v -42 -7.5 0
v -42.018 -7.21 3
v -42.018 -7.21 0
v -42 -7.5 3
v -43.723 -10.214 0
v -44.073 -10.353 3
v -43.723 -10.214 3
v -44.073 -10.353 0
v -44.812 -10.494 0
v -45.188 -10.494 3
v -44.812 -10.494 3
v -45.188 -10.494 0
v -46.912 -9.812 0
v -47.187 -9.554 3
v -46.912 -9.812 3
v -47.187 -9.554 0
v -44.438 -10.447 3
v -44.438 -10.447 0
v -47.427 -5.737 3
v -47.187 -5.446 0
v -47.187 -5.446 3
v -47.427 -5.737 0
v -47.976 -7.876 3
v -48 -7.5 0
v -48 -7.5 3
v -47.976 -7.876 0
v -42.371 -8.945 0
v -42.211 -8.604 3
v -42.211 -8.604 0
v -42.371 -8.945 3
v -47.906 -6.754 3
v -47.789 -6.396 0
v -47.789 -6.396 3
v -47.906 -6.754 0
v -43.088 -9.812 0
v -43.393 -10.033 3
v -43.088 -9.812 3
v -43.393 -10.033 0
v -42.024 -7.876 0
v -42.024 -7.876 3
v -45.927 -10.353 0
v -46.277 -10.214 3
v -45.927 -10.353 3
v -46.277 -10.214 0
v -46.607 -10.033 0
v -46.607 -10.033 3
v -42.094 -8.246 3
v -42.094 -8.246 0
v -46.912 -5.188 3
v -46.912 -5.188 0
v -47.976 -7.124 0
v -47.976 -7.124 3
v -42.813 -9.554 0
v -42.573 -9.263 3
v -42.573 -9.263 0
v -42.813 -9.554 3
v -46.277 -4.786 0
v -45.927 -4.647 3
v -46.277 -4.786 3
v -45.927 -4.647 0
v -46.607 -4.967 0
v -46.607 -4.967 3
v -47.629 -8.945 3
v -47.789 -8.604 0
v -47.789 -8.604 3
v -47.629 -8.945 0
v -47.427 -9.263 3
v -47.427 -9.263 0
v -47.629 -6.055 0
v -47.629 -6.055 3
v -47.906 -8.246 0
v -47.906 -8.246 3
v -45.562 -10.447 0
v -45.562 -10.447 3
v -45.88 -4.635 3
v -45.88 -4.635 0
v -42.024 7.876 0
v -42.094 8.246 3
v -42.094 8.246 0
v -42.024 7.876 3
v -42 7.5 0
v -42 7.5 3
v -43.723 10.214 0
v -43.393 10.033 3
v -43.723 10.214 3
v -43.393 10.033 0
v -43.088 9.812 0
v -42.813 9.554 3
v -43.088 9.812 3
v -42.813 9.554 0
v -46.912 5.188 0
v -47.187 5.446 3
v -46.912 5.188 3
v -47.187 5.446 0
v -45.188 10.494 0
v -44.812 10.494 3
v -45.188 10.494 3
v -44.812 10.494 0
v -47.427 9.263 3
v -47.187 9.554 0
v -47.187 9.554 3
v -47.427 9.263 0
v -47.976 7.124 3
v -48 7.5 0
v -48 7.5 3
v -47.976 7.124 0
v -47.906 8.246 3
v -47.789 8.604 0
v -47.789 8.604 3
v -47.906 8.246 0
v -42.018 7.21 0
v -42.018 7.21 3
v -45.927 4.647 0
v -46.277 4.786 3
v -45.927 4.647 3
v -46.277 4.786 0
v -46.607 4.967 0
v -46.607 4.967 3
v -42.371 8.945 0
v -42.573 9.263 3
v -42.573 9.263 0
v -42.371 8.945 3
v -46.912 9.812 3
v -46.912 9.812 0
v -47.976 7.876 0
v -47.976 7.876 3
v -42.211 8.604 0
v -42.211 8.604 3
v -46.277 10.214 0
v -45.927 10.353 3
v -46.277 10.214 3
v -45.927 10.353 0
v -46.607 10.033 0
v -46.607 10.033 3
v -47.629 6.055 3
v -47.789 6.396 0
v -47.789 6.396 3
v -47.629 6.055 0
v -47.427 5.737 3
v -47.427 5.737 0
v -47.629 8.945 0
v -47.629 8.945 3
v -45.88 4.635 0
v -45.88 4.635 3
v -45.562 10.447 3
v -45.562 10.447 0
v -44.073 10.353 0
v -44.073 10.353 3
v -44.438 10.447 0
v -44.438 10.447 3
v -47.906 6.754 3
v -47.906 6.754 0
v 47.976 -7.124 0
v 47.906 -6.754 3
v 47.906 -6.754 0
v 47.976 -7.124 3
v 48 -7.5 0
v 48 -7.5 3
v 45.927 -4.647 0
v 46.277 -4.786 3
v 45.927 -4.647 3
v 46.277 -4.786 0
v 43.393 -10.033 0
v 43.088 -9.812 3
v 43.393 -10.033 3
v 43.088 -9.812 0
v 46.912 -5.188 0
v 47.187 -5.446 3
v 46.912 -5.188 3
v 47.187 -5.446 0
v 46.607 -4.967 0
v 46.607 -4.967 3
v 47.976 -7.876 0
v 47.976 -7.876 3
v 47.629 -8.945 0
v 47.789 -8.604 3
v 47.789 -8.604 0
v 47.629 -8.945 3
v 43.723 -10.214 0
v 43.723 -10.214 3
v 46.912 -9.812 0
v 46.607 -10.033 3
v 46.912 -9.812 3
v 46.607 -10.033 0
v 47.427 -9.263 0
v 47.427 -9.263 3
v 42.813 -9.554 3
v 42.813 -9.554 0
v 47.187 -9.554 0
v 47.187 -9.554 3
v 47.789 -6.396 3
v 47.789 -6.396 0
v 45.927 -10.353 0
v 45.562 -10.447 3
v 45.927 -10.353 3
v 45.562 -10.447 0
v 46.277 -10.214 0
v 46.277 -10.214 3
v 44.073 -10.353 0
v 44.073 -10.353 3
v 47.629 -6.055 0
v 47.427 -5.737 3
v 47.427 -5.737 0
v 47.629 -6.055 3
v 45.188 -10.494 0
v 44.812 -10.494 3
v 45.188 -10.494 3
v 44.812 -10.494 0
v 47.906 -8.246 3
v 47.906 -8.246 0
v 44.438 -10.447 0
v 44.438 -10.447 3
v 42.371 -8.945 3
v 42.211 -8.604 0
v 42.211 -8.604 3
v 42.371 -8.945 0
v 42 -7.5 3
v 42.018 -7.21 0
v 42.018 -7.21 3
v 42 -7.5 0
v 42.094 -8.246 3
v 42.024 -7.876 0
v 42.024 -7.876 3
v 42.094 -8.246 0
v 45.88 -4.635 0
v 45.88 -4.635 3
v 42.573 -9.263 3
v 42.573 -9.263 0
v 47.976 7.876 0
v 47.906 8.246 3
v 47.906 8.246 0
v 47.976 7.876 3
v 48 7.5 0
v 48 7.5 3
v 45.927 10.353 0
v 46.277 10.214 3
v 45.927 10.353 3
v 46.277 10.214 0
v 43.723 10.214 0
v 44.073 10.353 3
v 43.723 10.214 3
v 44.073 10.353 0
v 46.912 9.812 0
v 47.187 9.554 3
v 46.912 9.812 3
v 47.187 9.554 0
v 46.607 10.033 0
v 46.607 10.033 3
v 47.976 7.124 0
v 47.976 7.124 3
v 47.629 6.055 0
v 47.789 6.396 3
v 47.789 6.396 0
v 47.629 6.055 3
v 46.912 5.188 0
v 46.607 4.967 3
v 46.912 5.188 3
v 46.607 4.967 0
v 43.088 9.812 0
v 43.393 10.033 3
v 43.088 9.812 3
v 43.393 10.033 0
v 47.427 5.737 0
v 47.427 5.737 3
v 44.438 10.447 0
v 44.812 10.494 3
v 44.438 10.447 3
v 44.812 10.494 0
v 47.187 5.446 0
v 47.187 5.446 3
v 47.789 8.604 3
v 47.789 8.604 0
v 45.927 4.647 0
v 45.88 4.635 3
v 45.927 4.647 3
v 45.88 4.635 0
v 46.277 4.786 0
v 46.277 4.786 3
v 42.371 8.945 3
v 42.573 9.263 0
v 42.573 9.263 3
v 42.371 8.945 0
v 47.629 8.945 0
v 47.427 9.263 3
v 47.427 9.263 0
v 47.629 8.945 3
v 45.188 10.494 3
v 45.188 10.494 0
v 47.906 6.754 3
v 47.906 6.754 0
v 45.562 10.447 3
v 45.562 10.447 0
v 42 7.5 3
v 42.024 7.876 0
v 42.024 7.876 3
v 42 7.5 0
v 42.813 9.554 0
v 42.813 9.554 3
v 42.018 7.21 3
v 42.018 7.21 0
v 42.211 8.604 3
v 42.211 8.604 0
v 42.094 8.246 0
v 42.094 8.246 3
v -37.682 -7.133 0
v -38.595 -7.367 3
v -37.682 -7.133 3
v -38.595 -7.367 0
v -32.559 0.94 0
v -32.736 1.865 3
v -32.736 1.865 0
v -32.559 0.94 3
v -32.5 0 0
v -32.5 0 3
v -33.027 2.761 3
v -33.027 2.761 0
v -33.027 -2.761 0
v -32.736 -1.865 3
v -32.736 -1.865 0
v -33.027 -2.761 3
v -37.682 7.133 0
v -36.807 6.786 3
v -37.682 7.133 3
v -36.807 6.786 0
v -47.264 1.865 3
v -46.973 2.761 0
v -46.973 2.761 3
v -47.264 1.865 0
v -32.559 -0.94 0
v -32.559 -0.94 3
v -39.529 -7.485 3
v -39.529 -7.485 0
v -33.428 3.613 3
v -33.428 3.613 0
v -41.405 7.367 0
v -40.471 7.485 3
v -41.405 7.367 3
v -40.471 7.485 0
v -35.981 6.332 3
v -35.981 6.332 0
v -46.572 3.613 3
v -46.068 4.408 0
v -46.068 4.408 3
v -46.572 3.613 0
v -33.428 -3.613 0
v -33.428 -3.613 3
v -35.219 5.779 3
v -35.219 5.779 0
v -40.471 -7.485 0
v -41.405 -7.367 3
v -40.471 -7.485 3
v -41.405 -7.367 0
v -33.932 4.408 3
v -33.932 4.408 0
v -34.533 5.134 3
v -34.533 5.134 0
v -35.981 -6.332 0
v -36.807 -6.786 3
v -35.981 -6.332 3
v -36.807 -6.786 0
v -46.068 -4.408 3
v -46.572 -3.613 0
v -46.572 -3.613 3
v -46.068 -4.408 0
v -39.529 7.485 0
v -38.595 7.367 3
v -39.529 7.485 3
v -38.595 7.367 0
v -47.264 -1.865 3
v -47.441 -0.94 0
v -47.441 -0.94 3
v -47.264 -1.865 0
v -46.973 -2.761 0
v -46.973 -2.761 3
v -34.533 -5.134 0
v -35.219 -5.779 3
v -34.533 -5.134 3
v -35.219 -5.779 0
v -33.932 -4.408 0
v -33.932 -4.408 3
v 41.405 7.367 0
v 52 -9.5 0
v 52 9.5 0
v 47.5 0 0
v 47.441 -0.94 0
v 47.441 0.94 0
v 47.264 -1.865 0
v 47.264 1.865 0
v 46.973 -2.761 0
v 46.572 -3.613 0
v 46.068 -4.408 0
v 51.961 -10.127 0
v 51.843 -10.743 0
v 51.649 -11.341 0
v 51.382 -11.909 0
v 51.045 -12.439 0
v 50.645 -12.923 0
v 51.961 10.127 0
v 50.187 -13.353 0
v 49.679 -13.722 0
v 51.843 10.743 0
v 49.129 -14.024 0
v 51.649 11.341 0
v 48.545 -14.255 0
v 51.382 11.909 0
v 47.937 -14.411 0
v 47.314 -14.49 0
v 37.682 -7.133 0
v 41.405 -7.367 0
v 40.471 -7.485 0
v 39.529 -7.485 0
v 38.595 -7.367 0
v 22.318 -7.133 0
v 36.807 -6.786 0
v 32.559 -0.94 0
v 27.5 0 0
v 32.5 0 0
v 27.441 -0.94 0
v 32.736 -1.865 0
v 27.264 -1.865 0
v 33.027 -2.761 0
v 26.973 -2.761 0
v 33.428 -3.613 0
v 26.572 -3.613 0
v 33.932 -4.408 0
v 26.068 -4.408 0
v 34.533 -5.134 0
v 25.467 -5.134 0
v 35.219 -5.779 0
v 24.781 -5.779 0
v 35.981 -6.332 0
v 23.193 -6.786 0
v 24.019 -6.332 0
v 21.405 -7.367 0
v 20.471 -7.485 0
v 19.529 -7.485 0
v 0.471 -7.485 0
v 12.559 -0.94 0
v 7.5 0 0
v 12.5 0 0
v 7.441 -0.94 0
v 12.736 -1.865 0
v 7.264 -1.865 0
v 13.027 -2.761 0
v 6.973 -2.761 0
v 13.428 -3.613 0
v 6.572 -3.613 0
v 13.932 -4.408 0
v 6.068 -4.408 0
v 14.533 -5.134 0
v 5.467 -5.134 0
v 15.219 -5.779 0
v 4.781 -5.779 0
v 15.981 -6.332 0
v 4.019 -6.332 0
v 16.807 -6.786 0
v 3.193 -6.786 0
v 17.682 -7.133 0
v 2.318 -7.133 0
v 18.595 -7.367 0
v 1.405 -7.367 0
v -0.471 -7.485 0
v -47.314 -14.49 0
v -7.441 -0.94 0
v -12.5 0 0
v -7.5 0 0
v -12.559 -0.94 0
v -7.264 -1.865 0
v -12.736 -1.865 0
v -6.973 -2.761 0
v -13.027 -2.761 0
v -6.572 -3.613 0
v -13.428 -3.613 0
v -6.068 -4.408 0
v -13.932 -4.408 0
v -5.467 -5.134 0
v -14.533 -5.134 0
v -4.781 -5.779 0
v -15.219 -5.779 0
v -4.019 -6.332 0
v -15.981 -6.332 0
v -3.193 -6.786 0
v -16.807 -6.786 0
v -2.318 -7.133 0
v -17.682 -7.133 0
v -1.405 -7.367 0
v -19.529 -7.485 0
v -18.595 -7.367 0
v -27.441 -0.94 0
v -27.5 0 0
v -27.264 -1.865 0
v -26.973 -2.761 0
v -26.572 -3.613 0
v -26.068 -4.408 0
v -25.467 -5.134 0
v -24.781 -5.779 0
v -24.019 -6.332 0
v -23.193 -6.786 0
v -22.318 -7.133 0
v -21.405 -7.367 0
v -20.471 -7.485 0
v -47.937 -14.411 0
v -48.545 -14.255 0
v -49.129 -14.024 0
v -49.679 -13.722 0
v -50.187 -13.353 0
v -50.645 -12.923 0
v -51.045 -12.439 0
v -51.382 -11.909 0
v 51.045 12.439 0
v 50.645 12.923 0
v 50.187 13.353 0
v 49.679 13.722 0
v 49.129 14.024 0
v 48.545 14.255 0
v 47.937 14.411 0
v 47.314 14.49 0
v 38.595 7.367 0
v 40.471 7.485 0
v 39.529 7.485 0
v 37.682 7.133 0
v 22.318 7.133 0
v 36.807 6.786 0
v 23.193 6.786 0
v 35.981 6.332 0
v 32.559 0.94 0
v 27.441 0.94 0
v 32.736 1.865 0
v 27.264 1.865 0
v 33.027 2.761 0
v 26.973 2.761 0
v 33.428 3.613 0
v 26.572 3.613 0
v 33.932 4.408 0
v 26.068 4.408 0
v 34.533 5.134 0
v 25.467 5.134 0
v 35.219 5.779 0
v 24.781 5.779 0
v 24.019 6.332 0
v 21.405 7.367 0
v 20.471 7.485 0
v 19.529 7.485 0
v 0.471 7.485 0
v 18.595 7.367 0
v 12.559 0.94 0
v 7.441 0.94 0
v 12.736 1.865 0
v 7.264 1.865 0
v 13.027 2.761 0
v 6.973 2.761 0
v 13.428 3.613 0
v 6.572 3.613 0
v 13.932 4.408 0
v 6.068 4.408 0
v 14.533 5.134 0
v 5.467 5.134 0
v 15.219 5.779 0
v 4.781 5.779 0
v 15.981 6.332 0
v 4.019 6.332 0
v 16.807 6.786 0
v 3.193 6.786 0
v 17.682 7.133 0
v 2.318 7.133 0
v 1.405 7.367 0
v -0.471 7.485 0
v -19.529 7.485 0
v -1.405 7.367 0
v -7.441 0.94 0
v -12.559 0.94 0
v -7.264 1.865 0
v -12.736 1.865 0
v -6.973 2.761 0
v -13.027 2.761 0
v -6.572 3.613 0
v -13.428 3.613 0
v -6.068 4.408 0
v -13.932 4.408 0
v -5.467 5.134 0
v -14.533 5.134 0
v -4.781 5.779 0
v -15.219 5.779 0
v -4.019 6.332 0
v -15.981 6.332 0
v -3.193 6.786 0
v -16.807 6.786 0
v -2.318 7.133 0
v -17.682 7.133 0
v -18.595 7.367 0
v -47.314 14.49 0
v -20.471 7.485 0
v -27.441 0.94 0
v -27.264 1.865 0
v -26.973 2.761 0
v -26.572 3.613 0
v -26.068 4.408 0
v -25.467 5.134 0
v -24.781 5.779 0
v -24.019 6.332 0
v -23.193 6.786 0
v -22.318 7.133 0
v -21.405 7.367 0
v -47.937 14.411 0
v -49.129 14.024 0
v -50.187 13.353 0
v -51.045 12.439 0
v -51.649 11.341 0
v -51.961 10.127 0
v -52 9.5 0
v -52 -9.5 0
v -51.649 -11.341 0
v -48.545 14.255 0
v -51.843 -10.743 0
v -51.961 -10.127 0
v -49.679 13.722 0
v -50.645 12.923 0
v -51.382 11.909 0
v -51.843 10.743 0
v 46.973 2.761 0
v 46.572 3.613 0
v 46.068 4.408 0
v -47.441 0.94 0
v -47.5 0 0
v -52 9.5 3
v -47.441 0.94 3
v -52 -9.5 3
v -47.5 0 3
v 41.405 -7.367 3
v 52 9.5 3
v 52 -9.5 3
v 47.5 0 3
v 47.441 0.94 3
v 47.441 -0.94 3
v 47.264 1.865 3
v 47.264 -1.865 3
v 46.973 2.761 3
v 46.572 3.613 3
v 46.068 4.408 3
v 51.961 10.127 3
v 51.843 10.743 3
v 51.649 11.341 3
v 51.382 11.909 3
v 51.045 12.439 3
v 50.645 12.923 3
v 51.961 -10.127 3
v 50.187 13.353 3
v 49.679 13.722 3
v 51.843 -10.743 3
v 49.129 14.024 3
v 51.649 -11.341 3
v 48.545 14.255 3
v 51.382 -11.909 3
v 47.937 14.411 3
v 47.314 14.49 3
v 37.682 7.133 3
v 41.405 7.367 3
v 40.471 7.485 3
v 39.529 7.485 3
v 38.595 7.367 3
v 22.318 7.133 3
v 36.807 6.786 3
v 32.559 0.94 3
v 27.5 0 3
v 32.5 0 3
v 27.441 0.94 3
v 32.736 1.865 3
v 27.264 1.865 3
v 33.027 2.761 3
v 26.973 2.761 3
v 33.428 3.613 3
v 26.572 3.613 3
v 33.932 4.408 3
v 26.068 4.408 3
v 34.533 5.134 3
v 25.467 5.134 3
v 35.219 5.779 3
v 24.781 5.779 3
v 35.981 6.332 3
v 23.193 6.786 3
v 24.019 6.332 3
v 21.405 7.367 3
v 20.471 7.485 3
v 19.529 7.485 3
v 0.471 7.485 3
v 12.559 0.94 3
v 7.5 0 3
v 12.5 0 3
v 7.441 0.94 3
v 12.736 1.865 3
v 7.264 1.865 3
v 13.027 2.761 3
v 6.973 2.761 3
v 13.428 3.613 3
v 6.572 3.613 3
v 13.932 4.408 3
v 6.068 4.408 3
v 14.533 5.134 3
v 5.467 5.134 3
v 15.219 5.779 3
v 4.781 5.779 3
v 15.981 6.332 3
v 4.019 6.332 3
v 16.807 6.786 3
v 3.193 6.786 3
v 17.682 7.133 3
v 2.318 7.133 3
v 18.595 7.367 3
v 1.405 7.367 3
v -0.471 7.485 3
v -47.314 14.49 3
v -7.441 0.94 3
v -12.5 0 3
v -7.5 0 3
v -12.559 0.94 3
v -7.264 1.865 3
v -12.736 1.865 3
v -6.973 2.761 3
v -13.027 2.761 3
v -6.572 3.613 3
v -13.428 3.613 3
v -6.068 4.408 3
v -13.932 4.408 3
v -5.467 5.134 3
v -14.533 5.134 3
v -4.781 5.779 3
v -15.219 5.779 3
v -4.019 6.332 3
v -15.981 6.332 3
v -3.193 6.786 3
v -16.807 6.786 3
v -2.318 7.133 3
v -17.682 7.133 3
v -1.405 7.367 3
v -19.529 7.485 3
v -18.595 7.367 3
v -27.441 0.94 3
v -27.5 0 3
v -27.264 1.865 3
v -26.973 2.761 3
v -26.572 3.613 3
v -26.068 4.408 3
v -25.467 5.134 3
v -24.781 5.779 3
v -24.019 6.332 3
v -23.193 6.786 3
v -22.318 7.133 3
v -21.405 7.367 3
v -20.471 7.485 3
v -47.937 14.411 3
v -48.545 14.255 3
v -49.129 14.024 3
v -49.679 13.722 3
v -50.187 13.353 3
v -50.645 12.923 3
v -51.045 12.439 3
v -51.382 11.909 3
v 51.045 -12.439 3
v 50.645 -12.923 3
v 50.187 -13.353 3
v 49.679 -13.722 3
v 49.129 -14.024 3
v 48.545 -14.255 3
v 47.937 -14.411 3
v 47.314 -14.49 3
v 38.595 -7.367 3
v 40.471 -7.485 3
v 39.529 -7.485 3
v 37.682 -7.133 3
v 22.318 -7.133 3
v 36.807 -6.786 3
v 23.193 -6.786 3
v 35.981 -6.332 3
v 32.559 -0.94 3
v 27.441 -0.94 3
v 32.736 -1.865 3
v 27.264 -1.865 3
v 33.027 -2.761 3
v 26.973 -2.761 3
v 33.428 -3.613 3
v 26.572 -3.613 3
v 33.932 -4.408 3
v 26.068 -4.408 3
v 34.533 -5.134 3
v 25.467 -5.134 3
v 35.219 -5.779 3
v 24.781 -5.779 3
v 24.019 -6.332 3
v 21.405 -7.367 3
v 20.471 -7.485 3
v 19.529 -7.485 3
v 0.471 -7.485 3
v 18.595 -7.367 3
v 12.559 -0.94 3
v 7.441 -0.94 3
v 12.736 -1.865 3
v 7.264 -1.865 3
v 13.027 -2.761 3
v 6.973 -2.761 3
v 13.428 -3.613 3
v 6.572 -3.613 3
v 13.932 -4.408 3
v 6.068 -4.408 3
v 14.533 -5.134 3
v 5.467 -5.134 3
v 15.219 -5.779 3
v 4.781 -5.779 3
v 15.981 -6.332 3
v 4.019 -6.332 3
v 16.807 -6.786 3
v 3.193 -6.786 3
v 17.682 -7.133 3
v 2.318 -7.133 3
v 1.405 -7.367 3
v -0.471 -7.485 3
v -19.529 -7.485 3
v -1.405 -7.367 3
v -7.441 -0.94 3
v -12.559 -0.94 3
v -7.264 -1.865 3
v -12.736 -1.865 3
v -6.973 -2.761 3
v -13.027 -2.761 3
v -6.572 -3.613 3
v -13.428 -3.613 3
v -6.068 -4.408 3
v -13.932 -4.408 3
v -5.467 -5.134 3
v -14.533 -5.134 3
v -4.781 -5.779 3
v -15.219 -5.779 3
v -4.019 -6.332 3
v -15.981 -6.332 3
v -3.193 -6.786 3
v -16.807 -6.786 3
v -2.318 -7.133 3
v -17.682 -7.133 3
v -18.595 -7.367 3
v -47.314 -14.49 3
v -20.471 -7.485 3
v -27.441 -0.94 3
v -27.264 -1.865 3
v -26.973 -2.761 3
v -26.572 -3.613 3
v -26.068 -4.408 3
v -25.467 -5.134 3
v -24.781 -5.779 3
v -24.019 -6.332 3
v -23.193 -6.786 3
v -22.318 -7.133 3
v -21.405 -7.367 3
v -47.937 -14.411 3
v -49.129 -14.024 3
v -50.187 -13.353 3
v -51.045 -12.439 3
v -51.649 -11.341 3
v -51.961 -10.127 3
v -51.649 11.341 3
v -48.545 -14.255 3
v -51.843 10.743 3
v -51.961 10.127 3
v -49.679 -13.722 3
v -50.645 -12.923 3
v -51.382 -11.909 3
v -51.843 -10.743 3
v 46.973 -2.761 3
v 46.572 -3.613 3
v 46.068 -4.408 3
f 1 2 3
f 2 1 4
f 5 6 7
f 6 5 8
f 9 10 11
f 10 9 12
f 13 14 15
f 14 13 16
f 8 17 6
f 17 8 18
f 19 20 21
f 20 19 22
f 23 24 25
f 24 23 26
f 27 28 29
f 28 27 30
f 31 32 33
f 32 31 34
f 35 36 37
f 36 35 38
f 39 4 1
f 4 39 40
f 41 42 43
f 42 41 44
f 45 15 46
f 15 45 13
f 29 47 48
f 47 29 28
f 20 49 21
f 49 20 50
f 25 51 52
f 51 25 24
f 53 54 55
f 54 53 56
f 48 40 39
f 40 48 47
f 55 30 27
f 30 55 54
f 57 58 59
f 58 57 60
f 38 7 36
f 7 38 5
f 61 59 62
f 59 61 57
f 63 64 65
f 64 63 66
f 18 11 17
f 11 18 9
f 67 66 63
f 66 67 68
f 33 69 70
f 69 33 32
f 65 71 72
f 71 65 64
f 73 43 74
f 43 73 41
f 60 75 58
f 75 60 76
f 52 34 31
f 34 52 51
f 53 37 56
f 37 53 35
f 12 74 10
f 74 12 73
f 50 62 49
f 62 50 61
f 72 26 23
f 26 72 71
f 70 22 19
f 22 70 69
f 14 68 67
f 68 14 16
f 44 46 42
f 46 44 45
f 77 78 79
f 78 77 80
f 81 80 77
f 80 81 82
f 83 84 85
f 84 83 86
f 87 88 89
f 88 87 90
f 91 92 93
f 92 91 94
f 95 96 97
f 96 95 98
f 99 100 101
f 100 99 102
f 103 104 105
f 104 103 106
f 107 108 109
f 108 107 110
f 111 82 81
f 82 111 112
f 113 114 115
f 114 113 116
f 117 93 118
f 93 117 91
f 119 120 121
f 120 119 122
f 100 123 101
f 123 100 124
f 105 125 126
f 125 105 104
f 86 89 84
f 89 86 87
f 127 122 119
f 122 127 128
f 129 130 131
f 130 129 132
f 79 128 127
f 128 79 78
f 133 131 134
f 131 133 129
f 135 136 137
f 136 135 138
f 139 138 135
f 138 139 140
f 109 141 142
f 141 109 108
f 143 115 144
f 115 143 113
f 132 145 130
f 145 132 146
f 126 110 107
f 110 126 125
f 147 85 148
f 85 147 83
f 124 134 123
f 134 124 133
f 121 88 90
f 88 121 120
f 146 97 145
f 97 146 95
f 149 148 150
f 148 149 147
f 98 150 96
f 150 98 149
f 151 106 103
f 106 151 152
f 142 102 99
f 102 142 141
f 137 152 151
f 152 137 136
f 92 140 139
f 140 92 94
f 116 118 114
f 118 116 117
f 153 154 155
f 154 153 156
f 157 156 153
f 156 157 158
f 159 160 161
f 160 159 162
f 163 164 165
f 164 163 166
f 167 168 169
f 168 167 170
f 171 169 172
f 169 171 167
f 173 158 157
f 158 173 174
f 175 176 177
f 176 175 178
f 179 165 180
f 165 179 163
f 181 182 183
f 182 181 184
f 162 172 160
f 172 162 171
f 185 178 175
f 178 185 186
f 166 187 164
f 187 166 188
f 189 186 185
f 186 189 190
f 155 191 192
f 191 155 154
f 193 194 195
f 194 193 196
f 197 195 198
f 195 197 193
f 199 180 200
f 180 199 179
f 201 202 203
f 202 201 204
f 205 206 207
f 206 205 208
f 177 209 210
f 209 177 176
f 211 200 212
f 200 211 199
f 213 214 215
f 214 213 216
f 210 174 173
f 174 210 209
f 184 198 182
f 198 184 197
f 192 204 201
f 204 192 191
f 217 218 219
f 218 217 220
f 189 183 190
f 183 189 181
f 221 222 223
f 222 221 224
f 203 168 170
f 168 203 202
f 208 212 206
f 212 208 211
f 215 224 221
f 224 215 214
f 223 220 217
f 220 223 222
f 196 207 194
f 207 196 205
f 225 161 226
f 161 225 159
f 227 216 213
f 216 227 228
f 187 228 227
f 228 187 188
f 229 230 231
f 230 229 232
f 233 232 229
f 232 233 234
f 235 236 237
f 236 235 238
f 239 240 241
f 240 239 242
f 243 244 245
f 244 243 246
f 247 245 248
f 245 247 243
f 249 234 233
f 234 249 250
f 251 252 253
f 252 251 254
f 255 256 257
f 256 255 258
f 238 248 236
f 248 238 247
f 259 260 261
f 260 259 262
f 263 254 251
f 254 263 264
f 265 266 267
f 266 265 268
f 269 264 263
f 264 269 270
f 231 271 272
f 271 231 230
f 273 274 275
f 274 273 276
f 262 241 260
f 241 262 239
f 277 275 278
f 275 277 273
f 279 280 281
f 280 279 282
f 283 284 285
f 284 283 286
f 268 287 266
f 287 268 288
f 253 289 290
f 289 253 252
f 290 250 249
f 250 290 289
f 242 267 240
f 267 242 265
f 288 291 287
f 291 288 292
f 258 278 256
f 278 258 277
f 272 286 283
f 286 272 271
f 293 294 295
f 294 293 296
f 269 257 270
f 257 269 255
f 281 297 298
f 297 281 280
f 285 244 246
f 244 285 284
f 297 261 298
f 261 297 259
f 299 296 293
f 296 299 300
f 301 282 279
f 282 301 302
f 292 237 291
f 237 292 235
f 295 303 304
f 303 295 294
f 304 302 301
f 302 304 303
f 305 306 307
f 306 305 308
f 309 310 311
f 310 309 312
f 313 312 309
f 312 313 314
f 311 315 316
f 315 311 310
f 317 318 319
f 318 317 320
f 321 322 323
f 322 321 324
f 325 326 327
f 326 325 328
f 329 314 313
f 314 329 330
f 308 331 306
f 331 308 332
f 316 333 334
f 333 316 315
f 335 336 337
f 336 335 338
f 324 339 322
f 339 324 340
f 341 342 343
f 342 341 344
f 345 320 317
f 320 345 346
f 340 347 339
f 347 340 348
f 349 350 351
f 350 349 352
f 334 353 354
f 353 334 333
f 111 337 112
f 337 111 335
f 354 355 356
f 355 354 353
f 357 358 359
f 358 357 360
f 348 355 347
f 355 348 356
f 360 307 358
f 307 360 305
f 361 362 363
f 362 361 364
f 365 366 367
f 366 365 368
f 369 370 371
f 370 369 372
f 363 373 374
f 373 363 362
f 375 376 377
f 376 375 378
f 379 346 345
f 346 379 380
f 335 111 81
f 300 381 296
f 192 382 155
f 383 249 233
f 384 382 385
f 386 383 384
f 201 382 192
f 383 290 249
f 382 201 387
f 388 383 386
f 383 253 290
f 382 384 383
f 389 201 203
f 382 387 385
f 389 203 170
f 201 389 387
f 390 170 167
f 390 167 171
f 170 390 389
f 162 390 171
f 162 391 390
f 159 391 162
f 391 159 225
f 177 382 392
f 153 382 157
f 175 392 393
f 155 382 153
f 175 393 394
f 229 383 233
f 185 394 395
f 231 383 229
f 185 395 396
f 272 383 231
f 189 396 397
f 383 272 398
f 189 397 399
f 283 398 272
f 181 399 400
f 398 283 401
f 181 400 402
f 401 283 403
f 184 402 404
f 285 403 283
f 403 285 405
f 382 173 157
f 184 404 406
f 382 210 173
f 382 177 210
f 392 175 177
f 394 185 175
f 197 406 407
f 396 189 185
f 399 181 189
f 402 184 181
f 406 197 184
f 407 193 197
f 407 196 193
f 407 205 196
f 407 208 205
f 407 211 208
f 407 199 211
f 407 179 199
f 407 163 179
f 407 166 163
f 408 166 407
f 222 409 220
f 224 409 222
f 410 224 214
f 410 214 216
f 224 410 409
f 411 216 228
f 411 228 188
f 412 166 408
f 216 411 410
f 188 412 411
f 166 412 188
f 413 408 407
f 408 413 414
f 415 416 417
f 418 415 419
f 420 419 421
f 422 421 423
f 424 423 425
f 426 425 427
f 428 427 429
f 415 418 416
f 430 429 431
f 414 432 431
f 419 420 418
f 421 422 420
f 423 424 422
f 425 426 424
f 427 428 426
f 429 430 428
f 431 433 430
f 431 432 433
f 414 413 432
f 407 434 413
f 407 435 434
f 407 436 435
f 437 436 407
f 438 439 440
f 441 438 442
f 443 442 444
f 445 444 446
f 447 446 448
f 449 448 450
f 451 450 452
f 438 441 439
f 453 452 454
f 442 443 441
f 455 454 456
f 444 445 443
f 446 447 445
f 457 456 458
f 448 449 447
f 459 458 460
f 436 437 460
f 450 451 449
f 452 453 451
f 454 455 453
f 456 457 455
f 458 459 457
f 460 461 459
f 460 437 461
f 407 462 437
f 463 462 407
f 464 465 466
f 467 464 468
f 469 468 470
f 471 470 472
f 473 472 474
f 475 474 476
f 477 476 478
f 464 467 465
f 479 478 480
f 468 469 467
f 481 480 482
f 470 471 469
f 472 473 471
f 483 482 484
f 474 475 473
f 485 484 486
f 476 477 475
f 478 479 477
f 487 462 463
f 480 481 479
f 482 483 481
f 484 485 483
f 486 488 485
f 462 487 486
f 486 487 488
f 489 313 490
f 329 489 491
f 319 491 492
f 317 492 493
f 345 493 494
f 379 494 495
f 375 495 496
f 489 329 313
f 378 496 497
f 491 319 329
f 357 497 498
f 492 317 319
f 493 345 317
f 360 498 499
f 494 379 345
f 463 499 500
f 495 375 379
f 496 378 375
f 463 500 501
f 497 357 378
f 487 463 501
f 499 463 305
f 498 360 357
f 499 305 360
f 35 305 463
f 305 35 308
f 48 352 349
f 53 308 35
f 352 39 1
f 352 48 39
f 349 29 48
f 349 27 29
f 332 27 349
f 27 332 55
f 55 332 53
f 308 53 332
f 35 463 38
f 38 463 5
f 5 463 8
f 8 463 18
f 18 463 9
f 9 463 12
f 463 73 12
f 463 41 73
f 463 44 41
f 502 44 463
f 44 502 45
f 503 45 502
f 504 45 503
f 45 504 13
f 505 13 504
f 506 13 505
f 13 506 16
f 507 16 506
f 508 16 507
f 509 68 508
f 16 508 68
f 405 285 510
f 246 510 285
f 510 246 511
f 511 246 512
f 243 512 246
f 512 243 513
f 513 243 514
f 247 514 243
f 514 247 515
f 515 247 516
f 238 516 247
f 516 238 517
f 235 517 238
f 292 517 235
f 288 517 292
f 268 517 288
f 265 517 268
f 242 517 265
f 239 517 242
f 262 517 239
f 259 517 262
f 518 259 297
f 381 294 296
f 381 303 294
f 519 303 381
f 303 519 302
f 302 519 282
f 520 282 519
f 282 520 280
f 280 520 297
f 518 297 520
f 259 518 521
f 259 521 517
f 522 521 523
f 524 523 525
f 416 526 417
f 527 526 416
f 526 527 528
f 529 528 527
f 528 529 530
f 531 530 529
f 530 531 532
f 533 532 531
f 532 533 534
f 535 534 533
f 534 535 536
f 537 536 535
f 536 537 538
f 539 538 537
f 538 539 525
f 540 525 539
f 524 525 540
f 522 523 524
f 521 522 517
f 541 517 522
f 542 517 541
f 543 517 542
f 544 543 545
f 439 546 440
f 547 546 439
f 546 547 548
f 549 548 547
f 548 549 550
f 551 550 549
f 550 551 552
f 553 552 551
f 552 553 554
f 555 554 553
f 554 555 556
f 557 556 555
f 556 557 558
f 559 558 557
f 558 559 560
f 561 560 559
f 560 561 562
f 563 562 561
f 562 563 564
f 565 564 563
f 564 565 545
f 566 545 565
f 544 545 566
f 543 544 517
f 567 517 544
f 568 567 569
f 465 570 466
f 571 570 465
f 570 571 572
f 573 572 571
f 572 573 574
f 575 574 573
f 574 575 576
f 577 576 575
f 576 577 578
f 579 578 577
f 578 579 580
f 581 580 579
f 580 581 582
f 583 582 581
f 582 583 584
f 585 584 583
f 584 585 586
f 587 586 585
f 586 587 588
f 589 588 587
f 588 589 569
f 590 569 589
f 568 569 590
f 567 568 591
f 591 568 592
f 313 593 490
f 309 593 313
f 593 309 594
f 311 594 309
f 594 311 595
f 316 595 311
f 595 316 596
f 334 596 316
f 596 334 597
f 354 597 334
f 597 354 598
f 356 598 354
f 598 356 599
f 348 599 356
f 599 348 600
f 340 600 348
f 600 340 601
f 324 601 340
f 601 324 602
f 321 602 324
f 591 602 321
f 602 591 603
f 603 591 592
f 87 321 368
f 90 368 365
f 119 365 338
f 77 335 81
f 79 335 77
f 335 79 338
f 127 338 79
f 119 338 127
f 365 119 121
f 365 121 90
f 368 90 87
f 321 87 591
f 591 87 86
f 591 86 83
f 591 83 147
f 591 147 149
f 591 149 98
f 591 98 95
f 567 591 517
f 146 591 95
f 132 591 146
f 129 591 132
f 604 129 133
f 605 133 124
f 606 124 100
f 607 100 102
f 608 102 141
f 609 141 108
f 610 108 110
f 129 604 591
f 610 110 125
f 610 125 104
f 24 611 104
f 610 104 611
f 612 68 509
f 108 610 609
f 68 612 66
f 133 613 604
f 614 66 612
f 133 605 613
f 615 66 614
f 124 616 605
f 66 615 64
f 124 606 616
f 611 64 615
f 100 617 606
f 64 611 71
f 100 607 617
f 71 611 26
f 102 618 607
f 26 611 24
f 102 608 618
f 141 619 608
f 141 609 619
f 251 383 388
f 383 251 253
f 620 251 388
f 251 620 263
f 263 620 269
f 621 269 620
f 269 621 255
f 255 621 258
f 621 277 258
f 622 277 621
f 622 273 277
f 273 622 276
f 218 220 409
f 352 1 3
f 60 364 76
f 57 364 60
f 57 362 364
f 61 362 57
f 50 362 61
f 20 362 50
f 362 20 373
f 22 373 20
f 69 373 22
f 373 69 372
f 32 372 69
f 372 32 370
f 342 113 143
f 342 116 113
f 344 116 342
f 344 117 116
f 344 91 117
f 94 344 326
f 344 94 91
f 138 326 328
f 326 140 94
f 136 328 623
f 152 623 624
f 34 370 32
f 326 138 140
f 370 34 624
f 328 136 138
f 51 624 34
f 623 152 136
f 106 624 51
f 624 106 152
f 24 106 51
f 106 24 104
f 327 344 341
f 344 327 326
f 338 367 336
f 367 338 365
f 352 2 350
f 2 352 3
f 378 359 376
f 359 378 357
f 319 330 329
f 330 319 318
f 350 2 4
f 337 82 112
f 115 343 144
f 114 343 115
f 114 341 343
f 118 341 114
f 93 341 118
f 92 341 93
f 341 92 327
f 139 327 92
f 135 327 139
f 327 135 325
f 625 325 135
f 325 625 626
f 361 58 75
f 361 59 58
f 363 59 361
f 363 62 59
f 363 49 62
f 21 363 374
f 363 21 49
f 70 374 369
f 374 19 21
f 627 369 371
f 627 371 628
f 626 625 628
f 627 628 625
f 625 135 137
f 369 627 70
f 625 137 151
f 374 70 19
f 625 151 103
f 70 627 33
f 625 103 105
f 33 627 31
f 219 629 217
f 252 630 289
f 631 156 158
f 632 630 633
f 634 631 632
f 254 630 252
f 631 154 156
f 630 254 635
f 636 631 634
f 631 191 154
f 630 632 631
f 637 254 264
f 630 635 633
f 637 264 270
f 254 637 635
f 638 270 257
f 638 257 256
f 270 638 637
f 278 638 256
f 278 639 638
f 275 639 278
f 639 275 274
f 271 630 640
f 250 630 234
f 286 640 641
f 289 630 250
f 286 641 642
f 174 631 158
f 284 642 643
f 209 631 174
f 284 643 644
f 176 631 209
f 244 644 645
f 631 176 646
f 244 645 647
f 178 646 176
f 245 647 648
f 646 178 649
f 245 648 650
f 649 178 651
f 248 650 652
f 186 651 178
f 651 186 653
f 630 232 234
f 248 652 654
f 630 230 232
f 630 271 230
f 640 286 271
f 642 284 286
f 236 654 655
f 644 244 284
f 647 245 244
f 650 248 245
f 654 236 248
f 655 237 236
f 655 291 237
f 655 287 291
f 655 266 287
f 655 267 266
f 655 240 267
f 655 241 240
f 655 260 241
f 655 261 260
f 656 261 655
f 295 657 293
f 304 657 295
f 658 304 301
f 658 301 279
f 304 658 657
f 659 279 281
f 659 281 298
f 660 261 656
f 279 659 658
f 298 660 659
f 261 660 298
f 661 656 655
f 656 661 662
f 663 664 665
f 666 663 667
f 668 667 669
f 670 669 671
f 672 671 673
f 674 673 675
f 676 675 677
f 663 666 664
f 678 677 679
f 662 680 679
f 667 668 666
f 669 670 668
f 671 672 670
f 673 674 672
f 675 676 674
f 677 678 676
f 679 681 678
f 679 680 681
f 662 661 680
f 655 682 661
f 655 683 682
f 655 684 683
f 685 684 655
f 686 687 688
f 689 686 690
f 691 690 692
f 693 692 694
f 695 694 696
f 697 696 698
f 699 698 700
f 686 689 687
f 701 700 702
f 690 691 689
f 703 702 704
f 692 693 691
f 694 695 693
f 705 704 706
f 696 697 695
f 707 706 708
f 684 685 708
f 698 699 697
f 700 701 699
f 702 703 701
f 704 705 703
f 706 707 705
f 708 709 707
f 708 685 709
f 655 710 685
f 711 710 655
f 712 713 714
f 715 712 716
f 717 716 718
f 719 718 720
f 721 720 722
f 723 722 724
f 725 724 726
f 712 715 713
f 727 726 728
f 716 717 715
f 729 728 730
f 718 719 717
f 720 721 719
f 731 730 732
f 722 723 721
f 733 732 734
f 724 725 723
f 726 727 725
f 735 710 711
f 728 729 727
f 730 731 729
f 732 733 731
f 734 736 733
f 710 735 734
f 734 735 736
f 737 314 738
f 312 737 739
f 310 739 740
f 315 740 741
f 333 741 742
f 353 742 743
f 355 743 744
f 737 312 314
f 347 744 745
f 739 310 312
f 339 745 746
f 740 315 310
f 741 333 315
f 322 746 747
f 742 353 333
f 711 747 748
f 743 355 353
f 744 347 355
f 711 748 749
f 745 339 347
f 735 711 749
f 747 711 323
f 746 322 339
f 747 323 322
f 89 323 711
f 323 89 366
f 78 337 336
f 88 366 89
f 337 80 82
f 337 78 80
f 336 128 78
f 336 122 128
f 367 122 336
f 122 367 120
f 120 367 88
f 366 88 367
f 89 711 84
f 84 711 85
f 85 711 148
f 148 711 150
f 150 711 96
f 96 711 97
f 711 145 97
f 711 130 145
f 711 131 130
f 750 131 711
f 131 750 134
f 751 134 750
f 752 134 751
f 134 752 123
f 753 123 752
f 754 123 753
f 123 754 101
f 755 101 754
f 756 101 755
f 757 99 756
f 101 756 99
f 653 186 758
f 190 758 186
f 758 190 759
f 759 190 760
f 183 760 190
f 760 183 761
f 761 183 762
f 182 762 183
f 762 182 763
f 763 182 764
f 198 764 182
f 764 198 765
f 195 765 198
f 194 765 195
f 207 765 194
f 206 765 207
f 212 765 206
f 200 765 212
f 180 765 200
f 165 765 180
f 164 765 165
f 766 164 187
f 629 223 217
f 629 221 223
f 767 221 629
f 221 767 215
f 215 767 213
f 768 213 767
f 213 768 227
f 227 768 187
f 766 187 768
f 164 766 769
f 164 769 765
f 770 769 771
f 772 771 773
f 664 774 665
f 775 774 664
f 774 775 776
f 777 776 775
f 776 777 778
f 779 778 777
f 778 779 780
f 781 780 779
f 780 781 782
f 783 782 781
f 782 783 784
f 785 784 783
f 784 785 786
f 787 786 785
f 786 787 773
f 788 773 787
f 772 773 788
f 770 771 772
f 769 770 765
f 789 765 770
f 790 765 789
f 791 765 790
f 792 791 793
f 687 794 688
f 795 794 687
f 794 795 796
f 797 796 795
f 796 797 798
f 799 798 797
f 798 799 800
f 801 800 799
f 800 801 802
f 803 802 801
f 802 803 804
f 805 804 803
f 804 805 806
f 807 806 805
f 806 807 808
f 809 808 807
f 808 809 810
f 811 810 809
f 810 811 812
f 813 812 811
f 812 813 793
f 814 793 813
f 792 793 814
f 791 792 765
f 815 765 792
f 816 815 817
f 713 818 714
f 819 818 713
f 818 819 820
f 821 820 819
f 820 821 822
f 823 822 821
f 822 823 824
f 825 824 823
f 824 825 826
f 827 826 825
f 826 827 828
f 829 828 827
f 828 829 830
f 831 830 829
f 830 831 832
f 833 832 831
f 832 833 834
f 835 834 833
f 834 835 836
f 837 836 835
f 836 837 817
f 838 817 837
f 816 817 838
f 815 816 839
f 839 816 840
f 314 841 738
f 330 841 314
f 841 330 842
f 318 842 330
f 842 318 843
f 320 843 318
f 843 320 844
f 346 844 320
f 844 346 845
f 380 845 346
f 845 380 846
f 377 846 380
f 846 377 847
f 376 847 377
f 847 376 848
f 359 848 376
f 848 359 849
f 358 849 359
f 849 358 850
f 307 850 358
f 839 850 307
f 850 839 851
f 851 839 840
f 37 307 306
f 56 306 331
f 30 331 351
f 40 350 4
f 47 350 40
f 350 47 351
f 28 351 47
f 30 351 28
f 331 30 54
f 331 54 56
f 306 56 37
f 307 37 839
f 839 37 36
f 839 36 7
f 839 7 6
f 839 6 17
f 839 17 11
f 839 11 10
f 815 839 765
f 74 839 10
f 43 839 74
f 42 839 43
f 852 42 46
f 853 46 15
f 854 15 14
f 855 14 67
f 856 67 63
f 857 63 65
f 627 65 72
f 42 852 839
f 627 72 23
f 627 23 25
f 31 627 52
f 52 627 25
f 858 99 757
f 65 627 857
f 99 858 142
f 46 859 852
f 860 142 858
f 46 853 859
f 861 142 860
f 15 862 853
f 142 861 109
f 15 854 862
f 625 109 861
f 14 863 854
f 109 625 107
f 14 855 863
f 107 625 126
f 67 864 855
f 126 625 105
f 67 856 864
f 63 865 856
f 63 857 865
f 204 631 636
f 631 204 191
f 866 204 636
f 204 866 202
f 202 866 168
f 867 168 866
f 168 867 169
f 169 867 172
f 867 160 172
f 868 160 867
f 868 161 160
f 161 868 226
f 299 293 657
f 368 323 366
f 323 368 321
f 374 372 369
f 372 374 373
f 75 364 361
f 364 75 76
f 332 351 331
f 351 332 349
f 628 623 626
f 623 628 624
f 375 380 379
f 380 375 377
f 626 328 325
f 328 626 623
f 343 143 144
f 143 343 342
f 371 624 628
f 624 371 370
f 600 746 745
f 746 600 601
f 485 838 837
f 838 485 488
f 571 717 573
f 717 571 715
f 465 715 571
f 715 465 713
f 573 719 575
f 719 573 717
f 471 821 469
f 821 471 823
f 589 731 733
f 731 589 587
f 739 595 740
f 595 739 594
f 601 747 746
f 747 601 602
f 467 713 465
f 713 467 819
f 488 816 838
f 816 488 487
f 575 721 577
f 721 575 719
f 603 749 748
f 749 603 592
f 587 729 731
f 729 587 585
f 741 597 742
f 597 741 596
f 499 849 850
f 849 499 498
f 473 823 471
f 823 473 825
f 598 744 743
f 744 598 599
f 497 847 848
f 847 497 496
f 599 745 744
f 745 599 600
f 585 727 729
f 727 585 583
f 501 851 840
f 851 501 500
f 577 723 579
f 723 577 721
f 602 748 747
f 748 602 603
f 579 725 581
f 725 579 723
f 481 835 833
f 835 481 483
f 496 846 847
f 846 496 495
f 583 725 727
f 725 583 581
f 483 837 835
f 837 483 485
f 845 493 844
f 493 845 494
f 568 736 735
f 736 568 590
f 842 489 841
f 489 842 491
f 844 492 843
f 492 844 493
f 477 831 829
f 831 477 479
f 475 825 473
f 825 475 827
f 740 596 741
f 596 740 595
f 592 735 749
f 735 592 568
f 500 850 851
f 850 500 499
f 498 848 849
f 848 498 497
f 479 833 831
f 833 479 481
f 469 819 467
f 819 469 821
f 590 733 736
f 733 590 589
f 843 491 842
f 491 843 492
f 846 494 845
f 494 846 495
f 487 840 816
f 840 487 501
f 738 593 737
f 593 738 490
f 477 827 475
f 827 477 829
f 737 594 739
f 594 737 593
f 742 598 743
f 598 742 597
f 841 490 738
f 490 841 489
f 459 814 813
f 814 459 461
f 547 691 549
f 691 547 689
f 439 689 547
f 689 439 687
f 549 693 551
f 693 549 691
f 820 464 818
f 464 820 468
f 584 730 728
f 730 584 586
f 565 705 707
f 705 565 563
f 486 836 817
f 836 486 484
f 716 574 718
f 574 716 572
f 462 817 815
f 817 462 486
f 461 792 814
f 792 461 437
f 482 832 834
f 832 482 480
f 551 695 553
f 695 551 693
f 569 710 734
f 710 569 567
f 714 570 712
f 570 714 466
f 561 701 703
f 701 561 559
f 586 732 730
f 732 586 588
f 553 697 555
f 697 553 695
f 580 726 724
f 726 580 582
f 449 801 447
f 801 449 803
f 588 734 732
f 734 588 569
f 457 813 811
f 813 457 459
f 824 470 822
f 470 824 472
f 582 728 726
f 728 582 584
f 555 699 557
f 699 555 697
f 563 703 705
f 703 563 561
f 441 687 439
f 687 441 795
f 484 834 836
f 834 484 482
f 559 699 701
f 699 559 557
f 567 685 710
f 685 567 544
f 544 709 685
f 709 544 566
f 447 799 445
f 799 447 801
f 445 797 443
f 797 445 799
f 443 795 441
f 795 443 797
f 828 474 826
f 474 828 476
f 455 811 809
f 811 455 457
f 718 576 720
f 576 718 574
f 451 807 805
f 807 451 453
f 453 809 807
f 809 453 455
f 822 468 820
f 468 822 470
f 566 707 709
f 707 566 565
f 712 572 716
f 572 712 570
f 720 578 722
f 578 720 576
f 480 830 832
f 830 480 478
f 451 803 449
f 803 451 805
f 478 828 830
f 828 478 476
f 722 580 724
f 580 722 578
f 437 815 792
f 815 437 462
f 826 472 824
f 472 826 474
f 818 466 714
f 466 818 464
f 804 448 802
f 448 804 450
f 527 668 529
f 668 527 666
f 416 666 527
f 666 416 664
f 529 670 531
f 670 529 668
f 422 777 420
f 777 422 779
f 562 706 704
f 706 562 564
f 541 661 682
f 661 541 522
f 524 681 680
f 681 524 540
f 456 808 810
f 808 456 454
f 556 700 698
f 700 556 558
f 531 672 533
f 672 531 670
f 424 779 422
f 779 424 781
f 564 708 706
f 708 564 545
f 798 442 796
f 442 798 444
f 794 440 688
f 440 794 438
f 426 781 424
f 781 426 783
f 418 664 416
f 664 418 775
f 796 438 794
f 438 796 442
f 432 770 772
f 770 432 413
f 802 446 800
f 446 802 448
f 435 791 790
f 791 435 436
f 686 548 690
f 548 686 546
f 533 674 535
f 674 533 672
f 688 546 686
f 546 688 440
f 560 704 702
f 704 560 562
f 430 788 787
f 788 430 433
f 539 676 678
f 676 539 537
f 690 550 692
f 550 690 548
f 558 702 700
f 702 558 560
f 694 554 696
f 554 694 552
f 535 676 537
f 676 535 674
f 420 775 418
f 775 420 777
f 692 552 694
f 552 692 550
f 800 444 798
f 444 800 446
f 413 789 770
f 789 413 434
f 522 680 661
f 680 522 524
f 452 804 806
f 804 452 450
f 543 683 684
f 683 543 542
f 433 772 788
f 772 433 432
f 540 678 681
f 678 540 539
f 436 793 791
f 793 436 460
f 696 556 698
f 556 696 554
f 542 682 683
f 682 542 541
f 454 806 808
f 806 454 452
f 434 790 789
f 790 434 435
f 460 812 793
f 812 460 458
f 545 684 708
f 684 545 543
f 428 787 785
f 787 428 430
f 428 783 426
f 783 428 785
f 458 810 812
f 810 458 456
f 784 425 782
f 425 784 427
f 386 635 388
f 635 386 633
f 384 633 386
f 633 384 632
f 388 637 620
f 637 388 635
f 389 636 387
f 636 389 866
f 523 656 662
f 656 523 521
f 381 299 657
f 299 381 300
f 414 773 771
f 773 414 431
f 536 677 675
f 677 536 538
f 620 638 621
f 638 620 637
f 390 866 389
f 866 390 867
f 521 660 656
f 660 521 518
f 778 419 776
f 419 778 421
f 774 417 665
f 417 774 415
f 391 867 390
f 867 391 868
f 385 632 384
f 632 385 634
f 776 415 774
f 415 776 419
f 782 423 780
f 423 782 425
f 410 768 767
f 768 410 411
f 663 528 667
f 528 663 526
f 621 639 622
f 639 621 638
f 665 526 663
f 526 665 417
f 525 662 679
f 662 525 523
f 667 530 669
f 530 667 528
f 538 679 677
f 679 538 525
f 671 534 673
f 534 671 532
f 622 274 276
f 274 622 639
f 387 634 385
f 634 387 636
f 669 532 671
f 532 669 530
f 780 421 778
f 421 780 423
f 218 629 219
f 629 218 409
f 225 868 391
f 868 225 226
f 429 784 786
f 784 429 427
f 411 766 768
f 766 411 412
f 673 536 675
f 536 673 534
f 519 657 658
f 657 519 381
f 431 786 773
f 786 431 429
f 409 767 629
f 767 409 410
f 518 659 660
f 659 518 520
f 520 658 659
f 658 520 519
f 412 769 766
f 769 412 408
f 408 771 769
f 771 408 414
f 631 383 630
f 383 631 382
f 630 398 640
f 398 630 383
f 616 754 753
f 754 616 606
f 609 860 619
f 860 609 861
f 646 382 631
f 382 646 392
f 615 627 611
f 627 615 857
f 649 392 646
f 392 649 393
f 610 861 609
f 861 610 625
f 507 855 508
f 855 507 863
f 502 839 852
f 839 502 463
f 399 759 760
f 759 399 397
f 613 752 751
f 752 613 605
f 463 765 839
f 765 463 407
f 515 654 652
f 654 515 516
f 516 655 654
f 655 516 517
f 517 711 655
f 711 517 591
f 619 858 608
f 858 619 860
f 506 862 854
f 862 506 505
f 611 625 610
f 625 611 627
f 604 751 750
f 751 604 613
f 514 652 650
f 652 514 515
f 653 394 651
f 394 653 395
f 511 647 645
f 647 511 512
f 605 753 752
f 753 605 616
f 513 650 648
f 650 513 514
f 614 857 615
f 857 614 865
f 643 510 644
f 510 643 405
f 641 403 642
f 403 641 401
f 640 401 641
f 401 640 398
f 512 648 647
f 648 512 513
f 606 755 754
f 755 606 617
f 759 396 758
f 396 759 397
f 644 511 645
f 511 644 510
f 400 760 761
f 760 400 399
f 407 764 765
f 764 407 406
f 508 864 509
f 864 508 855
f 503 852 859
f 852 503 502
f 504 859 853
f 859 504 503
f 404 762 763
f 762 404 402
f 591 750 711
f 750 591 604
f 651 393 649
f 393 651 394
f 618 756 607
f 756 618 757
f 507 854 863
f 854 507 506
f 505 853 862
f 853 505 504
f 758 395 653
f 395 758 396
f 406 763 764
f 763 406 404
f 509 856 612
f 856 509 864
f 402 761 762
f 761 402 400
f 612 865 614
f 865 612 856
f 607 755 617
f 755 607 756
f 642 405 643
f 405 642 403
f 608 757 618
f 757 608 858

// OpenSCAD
$fn = 50;


difference() {
	union() {
		hull() {
			translate(v = [-47.0000000000, 9.5000000000, 0]) {
				cylinder(h = 3, r = 5);
			}
			translate(v = [47.0000000000, 9.5000000000, 0]) {
				cylinder(h = 3, r = 5);
			}
			translate(v = [-47.0000000000, -9.5000000000, 0]) {
				cylinder(h = 3, r = 5);
			}
			translate(v = [47.0000000000, -9.5000000000, 0]) {
				cylinder(h = 3, r = 5);
			}
		}
	}
	union() {
		#translate(v = [-45.0000000000, -7.5000000000, -100.0000000000]) {
			cylinder(h = 200, r = 3.0000000000);
		}
		#translate(v = [-45.0000000000, 7.5000000000, -100.0000000000]) {
			cylinder(h = 200, r = 3.0000000000);
		}
		#translate(v = [45.0000000000, -7.5000000000, -100.0000000000]) {
			cylinder(h = 200, r = 3.0000000000);
		}
		#translate(v = [45.0000000000, 7.5000000000, -100.0000000000]) {
			cylinder(h = 200, r = 3.0000000000);
		}
		#translate(v = [-40.0000000000, 0, 0]) {
			cylinder(h = 3, r = 7.5000000000);
		}
		#translate(v = [-20.0000000000, 0, 0]) {
			cylinder(h = 3, r = 7.5000000000);
		}
		#cylinder(h = 3, r = 7.5000000000);
		#translate(v = [20.0000000000, 0, 0]) {
			cylinder(h = 3, r = 7.5000000000);
		}
		#translate(v = [40.0000000000, 0, 0]) {
			cylinder(h = 3, r = 7.5000000000);
		}
	}
}
